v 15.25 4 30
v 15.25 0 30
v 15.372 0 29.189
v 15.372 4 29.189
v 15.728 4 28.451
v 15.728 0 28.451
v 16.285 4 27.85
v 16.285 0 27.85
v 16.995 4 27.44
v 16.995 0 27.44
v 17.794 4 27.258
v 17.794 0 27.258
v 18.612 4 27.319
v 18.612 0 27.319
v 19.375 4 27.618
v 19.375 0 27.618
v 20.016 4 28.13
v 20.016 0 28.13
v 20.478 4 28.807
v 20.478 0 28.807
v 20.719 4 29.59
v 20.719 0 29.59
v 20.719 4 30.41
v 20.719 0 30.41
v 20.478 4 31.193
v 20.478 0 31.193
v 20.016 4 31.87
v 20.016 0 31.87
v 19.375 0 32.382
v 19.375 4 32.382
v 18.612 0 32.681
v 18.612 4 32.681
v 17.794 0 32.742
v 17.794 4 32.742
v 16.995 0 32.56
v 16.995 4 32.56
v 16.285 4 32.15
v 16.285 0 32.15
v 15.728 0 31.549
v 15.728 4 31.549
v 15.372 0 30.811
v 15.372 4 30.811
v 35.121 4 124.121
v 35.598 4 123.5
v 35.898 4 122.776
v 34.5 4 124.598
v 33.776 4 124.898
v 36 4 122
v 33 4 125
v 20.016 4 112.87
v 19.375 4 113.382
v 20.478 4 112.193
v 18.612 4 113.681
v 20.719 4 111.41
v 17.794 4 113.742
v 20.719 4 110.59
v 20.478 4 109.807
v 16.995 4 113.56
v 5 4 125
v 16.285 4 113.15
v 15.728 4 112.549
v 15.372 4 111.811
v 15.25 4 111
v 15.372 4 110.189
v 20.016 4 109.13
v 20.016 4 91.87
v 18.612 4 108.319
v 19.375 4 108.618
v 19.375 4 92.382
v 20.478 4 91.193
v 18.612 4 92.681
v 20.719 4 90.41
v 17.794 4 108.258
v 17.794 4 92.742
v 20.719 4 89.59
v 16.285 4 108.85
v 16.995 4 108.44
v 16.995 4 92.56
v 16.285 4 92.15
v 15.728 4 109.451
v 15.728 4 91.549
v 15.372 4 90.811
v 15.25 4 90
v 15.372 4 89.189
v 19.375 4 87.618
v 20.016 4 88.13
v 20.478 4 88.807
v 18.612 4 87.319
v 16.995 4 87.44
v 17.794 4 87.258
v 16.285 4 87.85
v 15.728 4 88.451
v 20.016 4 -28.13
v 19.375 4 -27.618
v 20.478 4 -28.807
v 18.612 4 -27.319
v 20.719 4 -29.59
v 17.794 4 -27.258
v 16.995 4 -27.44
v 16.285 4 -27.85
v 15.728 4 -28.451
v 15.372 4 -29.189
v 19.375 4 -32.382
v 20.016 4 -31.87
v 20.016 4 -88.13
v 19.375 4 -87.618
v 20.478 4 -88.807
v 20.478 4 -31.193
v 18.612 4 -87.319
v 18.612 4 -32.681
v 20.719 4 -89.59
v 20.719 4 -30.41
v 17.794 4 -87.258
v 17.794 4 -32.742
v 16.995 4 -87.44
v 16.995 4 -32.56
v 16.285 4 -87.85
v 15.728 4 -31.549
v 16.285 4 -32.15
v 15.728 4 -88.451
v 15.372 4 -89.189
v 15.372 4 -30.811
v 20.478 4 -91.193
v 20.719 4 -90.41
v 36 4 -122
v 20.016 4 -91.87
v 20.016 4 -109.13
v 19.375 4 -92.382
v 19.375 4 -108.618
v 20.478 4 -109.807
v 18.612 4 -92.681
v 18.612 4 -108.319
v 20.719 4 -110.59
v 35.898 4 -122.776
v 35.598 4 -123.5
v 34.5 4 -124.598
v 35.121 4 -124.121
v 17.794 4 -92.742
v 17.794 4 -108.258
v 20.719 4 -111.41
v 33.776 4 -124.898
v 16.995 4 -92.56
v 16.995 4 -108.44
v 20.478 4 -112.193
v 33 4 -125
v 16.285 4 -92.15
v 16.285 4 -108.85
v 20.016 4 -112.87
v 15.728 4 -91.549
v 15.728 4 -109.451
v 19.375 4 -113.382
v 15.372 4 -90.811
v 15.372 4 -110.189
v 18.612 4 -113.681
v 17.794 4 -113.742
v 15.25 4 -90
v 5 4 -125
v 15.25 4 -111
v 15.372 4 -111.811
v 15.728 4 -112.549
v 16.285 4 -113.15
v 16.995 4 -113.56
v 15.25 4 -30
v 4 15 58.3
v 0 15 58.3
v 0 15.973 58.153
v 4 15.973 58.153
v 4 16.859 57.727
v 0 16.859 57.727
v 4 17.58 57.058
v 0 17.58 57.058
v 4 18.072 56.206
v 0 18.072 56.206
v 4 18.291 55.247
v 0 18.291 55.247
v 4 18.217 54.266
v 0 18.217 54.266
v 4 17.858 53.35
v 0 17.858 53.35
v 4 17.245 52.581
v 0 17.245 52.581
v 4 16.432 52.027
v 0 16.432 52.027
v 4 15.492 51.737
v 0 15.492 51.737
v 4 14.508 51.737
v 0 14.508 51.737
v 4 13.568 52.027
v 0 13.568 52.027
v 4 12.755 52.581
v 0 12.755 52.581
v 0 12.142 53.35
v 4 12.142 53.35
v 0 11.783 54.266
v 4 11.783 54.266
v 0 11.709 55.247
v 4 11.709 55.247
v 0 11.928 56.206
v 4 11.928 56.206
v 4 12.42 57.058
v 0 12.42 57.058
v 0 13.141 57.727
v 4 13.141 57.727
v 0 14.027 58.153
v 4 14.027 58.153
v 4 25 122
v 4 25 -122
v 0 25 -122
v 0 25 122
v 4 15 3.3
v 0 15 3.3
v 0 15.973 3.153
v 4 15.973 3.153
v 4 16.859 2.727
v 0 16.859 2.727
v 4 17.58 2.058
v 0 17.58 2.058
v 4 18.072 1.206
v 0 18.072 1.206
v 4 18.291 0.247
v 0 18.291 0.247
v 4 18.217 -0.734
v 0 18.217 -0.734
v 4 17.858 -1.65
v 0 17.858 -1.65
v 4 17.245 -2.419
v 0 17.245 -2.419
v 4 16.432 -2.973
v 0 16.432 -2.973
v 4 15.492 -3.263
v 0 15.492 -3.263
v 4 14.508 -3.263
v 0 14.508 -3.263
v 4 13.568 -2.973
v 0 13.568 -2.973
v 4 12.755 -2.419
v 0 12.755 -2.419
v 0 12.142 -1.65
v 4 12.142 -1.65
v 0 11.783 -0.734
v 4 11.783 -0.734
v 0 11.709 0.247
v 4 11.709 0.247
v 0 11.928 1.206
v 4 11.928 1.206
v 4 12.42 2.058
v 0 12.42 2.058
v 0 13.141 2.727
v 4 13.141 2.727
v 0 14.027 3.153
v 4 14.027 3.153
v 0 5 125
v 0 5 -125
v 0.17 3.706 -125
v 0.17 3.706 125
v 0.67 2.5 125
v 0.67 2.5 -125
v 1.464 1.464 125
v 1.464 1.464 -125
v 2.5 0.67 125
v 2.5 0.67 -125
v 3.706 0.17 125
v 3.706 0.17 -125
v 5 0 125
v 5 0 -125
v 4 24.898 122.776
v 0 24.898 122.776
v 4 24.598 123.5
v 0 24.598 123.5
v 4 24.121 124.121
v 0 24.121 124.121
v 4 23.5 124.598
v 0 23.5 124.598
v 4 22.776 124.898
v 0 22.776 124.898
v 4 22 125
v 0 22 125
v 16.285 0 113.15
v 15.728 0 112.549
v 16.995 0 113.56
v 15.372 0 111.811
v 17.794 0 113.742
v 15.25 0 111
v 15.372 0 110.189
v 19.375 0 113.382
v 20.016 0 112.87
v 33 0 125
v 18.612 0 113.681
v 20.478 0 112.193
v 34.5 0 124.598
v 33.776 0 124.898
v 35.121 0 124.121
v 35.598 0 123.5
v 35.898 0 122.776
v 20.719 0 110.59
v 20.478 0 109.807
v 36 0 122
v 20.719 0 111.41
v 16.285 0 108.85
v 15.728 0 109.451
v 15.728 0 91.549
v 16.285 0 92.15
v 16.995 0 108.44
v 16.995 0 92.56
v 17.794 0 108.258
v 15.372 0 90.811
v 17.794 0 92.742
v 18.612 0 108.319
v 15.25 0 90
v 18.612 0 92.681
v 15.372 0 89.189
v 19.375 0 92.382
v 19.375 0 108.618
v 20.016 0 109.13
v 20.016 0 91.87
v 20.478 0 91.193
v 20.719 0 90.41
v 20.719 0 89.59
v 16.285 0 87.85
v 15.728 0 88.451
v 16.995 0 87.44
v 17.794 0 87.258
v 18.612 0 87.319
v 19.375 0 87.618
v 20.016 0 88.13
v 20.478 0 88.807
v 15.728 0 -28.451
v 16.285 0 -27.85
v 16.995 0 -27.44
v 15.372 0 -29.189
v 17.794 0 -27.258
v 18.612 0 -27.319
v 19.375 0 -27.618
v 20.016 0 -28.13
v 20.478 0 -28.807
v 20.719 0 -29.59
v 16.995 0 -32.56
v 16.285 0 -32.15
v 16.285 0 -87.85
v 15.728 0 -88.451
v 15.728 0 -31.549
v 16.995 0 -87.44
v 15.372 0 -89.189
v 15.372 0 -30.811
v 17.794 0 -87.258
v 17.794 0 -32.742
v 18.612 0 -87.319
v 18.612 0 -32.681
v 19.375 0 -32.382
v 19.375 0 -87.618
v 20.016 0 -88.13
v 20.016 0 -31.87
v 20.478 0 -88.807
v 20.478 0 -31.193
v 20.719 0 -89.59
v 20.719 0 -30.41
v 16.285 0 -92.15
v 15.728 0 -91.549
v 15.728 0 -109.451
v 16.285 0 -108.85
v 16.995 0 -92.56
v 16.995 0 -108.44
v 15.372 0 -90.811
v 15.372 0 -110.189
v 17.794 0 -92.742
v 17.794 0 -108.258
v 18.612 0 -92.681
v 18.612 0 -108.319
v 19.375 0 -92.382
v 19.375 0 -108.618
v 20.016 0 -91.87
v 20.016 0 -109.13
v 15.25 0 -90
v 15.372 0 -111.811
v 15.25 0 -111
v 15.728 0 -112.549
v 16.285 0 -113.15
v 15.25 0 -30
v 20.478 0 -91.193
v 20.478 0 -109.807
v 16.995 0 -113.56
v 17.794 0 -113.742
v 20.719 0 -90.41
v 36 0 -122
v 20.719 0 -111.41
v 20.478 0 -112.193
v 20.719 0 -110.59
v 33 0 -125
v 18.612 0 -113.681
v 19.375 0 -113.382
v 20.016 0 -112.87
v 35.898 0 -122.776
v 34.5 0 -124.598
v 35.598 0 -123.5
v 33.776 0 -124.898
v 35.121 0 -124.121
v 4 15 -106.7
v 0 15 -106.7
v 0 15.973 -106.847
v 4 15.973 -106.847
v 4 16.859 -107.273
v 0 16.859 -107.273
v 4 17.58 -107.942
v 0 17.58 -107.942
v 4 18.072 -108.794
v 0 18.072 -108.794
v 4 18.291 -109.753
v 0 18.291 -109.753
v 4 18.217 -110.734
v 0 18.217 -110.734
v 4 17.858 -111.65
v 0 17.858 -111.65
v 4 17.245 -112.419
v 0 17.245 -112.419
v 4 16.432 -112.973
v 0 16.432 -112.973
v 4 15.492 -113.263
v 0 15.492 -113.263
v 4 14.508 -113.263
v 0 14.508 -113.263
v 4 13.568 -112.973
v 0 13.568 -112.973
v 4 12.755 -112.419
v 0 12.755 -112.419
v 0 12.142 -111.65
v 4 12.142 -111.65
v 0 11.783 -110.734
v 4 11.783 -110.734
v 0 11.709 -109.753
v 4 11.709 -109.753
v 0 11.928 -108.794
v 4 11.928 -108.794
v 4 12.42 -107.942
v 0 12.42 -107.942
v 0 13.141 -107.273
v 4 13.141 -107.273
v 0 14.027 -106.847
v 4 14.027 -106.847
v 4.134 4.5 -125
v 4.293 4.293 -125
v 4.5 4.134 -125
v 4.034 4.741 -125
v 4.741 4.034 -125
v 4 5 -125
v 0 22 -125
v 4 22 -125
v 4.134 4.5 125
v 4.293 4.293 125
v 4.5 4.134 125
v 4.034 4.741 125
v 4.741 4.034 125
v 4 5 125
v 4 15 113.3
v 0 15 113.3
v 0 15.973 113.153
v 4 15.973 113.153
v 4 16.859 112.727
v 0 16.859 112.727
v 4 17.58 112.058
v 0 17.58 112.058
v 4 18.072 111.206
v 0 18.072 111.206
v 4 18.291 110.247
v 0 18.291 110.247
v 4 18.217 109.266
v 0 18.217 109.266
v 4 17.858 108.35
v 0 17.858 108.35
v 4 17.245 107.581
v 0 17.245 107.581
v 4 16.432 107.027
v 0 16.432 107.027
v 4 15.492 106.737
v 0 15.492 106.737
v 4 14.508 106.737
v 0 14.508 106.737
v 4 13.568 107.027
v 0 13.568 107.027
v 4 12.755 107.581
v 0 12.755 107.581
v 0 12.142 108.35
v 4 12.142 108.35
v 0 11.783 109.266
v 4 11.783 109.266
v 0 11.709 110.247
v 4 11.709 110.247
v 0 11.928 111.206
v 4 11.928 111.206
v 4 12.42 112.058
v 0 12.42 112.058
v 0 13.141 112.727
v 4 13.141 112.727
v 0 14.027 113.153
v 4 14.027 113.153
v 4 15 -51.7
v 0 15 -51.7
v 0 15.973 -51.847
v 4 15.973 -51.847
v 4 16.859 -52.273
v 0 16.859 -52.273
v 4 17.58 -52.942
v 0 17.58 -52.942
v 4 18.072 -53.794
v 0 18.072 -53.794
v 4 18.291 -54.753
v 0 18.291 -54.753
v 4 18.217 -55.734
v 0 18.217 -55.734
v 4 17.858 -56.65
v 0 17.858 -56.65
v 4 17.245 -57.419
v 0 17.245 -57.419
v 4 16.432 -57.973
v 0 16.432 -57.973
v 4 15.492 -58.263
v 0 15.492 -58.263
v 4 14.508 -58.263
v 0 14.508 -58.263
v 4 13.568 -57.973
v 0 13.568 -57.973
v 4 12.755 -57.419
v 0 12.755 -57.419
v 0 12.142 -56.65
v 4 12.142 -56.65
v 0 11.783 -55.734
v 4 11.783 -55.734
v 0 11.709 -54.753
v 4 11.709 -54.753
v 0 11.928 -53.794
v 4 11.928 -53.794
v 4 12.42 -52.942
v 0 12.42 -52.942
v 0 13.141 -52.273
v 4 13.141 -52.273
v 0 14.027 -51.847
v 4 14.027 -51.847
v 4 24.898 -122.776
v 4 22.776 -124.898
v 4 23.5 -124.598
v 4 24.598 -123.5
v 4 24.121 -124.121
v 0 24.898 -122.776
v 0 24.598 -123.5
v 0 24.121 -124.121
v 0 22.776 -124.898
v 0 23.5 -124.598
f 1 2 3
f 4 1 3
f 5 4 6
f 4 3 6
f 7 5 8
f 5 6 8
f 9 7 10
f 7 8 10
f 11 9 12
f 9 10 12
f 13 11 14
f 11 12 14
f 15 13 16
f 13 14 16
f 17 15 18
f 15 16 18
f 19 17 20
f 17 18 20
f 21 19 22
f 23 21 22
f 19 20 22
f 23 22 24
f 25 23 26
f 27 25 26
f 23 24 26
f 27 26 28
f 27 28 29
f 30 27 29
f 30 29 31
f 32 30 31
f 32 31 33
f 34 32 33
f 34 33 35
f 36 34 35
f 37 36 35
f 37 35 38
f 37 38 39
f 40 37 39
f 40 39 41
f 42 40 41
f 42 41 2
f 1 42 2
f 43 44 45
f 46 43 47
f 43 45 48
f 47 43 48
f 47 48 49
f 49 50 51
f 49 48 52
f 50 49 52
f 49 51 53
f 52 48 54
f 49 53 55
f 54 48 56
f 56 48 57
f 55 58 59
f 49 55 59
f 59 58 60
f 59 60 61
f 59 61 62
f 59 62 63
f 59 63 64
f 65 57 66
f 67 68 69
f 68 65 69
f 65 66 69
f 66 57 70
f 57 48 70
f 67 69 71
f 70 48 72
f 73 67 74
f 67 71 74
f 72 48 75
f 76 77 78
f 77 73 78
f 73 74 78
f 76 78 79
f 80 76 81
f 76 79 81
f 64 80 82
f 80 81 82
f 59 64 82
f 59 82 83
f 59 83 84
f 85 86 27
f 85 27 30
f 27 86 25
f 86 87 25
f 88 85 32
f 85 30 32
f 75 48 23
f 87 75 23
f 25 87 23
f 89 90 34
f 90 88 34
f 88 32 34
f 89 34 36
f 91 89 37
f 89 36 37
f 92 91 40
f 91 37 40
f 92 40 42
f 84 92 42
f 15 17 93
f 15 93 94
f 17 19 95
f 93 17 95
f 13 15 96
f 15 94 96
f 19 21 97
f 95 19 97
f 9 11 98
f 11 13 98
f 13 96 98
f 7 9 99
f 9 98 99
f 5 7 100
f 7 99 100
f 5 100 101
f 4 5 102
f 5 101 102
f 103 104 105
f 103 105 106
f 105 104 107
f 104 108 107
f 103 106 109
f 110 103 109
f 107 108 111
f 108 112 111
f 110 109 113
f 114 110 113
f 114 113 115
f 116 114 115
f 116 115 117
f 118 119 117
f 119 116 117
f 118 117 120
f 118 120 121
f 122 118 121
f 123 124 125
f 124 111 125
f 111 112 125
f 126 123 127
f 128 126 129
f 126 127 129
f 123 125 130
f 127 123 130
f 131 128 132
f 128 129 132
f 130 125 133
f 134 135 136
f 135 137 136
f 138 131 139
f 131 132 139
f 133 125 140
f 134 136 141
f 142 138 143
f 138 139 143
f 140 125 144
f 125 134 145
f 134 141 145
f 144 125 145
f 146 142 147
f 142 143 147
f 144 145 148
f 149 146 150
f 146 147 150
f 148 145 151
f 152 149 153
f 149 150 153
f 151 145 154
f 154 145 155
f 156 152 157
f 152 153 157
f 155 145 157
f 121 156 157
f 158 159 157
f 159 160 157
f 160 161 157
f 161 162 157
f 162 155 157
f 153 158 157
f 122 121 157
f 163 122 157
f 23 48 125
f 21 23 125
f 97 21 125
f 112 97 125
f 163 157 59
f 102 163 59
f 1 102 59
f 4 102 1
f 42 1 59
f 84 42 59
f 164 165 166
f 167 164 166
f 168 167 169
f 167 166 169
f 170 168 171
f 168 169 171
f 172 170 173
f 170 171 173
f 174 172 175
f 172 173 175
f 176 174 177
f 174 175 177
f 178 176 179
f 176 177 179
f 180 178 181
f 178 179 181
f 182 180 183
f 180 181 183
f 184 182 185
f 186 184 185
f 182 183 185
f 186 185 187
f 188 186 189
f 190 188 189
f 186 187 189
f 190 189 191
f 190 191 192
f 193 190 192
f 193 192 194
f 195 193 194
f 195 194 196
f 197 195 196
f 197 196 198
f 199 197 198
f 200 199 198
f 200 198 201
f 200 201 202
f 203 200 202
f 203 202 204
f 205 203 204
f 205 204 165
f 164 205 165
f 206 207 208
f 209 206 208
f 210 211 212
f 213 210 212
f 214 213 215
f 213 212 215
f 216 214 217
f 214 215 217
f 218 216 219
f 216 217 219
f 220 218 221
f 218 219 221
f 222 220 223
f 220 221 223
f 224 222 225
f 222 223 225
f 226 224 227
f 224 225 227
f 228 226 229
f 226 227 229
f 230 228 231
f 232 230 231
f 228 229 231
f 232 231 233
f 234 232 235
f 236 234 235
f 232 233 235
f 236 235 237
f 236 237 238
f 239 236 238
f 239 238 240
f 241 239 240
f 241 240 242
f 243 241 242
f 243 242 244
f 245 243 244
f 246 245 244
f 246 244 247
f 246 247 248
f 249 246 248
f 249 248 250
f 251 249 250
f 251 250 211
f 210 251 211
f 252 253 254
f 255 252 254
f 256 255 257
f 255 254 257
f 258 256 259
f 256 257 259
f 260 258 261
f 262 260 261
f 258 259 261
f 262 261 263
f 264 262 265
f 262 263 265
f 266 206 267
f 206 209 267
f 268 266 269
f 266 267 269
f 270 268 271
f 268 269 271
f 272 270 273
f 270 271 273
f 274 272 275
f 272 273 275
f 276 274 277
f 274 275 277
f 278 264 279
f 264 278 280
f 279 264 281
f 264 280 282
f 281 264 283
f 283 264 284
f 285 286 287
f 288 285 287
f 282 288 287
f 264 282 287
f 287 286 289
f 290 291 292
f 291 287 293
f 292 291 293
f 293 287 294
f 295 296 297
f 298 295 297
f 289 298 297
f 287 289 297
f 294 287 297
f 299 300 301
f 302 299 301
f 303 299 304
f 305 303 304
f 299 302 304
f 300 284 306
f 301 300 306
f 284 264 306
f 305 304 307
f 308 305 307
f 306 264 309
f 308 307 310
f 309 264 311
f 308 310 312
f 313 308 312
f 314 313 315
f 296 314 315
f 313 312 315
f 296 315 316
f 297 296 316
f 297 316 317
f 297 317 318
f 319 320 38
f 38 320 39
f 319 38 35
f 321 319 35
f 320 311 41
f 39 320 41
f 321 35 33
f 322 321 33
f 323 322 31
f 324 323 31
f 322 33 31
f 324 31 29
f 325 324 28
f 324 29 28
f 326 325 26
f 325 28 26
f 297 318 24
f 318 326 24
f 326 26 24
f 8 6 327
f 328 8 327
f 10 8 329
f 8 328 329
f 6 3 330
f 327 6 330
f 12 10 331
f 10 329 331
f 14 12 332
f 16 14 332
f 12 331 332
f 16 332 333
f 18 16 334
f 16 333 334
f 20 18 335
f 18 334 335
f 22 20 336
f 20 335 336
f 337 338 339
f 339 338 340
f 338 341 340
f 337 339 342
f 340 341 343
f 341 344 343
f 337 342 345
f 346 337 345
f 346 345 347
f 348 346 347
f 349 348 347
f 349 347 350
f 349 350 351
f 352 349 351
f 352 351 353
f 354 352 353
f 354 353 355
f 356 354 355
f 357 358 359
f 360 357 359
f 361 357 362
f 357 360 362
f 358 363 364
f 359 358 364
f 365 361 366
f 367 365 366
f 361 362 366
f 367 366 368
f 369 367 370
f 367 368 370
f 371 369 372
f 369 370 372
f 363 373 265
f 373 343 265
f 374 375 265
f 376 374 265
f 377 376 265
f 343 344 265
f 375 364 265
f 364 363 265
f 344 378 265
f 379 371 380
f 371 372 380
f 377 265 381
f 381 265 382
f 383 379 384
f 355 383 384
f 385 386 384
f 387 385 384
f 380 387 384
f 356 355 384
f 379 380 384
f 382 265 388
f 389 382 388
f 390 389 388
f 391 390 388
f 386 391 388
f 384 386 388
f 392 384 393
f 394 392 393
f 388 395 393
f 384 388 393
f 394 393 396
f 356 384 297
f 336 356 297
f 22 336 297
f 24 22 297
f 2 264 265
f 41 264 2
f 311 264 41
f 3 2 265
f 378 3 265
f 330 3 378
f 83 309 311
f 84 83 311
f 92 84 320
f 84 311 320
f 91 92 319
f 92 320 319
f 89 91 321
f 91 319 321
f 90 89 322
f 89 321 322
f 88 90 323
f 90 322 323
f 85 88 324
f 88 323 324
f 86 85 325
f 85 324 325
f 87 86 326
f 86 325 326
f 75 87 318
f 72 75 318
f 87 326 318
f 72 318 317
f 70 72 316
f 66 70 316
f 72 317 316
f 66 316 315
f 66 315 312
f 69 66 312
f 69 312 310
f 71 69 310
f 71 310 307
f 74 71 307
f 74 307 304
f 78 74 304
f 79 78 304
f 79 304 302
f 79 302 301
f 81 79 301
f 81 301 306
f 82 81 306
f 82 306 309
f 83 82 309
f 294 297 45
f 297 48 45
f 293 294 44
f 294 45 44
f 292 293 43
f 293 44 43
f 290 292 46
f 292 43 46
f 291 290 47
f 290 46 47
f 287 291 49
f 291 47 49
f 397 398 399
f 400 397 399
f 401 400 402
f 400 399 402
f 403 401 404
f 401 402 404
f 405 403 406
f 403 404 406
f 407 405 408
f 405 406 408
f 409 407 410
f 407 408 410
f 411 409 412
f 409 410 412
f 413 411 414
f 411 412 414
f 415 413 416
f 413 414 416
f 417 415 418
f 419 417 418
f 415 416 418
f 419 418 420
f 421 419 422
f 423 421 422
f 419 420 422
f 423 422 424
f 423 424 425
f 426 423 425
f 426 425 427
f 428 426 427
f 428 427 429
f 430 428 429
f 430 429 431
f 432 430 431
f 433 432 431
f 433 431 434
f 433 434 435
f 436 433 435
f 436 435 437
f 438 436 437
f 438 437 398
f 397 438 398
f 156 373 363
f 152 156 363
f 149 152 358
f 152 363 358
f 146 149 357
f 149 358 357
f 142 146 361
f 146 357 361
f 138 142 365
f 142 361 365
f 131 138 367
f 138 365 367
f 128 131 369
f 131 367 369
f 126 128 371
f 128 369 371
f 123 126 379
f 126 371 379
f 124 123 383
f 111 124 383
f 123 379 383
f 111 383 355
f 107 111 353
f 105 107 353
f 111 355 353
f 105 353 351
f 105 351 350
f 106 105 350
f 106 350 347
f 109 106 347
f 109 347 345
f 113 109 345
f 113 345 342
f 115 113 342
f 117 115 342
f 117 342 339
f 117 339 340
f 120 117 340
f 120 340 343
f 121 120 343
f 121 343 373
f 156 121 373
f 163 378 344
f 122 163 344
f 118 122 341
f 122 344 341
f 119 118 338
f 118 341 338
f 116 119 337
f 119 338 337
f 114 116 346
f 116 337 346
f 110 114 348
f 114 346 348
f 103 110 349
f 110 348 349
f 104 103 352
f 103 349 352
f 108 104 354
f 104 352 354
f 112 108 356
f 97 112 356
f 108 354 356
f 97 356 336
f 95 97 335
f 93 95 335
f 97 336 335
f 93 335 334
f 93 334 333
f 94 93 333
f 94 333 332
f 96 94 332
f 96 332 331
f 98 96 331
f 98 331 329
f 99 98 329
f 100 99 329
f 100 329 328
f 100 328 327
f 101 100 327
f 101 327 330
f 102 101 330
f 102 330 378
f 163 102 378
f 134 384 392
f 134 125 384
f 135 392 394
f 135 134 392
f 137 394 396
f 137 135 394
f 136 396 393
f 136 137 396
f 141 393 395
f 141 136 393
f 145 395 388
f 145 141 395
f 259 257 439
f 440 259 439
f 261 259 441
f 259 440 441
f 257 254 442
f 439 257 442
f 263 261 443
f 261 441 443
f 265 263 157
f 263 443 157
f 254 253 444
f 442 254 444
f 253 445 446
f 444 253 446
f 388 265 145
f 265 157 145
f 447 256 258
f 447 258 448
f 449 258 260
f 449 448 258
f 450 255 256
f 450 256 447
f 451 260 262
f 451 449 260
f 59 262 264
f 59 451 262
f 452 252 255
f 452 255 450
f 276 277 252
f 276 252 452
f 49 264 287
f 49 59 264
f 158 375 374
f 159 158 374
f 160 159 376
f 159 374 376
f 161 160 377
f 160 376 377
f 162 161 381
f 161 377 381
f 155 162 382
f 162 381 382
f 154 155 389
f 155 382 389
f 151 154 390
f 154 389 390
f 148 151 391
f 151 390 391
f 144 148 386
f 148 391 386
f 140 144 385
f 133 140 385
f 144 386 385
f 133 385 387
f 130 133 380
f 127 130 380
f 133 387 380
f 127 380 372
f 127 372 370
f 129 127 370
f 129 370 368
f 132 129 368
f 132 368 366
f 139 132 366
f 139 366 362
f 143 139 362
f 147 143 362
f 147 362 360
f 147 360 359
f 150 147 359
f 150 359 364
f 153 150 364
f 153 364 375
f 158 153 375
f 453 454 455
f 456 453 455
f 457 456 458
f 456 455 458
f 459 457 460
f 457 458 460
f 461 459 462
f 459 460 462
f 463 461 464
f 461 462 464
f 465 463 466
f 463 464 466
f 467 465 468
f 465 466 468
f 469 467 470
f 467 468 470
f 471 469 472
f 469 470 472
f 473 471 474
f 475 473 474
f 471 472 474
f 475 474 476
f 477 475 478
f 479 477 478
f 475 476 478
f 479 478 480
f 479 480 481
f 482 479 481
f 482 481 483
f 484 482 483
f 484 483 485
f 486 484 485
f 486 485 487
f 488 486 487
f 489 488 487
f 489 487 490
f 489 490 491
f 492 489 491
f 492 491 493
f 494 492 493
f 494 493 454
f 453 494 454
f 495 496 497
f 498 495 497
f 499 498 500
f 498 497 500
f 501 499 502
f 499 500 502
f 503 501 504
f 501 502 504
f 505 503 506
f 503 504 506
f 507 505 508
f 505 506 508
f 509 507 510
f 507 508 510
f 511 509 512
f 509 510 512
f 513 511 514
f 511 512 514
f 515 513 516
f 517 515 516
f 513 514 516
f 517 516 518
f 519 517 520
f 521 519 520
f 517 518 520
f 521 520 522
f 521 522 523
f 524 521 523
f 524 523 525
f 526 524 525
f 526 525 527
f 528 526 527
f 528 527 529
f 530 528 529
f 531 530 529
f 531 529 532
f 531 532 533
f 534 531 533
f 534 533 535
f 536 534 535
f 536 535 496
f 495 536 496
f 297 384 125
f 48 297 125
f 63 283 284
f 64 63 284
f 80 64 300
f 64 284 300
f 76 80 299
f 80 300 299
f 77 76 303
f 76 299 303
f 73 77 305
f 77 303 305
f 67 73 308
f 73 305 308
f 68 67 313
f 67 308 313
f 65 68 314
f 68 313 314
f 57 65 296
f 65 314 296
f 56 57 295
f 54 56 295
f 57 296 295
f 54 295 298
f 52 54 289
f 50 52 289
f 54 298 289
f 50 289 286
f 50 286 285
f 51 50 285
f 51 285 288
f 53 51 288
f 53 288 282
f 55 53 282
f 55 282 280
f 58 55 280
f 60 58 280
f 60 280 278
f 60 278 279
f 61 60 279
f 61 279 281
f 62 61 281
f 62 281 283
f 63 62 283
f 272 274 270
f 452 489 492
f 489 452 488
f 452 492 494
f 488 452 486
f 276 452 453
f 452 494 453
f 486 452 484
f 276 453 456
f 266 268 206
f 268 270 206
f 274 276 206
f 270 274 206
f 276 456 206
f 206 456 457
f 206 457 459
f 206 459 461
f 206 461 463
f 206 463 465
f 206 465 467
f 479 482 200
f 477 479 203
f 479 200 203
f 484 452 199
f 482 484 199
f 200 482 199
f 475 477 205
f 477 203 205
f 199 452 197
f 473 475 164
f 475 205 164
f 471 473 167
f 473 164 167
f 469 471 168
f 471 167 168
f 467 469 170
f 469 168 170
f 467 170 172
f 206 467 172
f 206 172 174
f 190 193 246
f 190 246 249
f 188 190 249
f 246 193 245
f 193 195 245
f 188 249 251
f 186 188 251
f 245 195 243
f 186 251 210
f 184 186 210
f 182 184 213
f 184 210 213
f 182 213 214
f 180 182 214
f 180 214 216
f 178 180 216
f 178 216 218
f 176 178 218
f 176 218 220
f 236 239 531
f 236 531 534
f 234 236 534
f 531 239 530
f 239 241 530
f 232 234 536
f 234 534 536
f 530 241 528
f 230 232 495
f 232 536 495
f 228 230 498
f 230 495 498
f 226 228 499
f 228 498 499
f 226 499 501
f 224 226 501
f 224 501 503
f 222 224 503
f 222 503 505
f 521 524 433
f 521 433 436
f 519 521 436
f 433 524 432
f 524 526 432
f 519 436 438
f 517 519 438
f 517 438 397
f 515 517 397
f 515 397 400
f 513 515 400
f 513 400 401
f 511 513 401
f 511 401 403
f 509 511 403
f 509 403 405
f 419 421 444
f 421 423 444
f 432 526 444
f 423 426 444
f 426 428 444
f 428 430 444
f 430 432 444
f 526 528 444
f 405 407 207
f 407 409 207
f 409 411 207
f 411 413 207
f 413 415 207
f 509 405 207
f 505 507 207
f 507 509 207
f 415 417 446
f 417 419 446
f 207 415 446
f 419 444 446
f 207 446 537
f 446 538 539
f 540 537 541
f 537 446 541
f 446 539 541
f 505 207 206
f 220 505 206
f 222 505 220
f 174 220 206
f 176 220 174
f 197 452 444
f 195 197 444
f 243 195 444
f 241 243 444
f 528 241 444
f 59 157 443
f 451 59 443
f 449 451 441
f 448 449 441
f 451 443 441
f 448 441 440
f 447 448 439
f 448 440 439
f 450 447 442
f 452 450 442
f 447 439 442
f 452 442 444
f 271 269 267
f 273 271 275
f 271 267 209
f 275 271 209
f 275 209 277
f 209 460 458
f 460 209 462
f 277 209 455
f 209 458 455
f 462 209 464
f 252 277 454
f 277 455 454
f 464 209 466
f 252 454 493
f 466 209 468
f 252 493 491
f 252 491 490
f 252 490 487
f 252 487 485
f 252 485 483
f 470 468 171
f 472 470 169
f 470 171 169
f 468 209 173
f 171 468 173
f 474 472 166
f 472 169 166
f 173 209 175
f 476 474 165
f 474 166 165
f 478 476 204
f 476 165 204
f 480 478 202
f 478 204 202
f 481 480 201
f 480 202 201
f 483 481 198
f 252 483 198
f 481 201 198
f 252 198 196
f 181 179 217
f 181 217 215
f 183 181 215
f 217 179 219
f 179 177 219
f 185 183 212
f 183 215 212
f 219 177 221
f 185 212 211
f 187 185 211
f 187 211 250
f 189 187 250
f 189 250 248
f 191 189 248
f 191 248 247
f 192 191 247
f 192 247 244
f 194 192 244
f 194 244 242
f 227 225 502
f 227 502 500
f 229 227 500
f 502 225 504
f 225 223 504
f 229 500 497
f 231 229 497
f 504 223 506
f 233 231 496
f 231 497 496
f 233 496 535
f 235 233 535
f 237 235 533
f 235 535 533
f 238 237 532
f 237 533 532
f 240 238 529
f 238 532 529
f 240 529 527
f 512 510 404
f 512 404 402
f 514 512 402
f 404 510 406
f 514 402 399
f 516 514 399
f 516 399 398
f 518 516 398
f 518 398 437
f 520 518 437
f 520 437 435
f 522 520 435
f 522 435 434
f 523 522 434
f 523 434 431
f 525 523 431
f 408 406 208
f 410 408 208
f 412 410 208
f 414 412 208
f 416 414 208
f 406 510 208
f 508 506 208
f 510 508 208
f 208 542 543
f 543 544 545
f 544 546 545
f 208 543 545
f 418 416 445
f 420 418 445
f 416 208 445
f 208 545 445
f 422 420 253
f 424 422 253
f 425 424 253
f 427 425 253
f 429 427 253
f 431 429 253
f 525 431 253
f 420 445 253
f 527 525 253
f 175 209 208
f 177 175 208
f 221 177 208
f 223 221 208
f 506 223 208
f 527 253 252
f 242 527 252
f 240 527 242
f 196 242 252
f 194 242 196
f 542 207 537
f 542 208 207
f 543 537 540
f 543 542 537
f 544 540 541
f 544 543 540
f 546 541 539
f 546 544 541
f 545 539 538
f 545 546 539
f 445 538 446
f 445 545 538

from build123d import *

# Parameters (mm, degrees)
BASE_FLANGE1_START   = -125
BASE_FLANGE1_DEPTH   = 250
FILLET1_R            = 3
M5_CLEARANCE_HOLE1_D = 5.5
M5_CLEARANCE_HOLE2_D = 5.5
M6_CLEARANCE_HOLE1_D = 6.6


# Read off the part's stored shape, not the designer's step: Base-Flange1
with BuildPart() as part:
    # Base-Flange1 outline → Base-Flange1 (new body)
    with BuildSketch(Plane.XY.offset(BASE_FLANGE1_START)):
        with BuildLine():
            Line((5, 0), (36, 0))
            Line((36, 0), (36, 4))
            Line((36, 4), (5, 4))
            ThreePointArc((5, 4), (4.292893219, 4.292893219), (4, 5))
            Line((4, 5), (4, 25))
            Line((4, 25), (0, 25))
            Line((0, 25), (0, 5))
            ThreePointArc((0, 5), (1.464466094, 1.464466094), (5, 0))
        make_face()
    extrude(amount=BASE_FLANGE1_DEPTH)

    # Fillet1
    fillet1_edges = [part.edges().sort_by_distance(p)[0] for p in [
        (2, 25, 125),
        (2, 25, -125),
        (36, 2, 125),
        (36, 2, -125),
    ]]
    fillet(fillet1_edges, radius=FILLET1_R)

    # M5 Clearance Hole1 (through all)
    with Locations(Plane(origin=(0, 4, 0), x_dir=(1, 0, 0), z_dir=(0, 1, 0))):
        with Locations((18, 90), (18, 30), (18, -30), (18, -90)):
            Hole(M5_CLEARANCE_HOLE1_D / 2)

    # M5 Clearance Hole2 (through all)
    with Locations(Plane(origin=(0, 4, 0), x_dir=(1, 0, 0), z_dir=(0, 1, 0))):
        with Locations((18, -111), (18, 111)):
            Hole(M5_CLEARANCE_HOLE2_D / 2)

    # M6 Clearance Hole1 (through all)
    with Locations(Plane(origin=(4, 0, 0), x_dir=(0, 0, -1), z_dir=(1, 0, 0))):
        with Locations((-110, 15), (-55, 15), (0, 15), (55, 15), (110, 15)):
            Hole(M6_CLEARANCE_HOLE1_D / 2)


solid = part.part
